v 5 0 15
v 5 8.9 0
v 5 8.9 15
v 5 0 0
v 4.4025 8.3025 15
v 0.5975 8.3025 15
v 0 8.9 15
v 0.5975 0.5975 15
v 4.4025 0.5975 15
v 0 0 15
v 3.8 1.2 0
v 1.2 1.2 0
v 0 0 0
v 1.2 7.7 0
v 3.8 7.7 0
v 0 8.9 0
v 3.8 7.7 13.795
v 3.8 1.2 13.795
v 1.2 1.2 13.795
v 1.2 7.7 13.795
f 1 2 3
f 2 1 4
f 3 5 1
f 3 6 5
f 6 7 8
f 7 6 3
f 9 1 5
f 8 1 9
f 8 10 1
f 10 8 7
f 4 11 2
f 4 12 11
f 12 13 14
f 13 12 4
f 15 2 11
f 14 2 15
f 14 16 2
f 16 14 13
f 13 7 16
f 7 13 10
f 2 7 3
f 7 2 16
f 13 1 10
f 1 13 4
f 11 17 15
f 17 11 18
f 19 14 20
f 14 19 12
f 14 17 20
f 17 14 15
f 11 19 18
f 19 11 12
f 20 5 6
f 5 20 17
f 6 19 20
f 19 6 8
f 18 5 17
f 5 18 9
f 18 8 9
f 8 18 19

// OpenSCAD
//CUSTOMIZER VARIABLES

//Inner size X in mm
inner_x=2.6;
//Inner size Y in mm
inner_y=6.5;
//Height Z in mm
height=15;

//CUSTOMIZER VARIABLES END

module BeltLock(x_in, y_in, h,  $fn=100) {
    wall = 1.2;
    difference(){
        cube([x_in+wall*2,y_in+wall*2,h]);
        translate([wall, wall,0])cube([x_in,y_in,h]);
        translate([(x_in+wall*2)/2,(y_in+wall*2)/2,h-wall])
            hull(){cube([x_in,y_in,0.01], center=true);
                translate([0,0,wall*2])cube([x_in+wall*2,y_in+wall*2,0.01],center=true);}
    
        }
}

BeltLock(inner_x, inner_y, height);
   
/* source   
translate([10,0,0])
difference(){
    cube([2.8+2.4,6.5+2.4,15]);
    translate([1.2,1.2,0])cube([2.8,6.5,15]);
    #translate([2.6,8.9/2,15-1.2])
  hull(){cube([2.8,6.5,0.01],center=true);
   translate([0,0,2.4])cube([2.8+2.4,6.5+2.4,0.01],center=true);}
}
*/
